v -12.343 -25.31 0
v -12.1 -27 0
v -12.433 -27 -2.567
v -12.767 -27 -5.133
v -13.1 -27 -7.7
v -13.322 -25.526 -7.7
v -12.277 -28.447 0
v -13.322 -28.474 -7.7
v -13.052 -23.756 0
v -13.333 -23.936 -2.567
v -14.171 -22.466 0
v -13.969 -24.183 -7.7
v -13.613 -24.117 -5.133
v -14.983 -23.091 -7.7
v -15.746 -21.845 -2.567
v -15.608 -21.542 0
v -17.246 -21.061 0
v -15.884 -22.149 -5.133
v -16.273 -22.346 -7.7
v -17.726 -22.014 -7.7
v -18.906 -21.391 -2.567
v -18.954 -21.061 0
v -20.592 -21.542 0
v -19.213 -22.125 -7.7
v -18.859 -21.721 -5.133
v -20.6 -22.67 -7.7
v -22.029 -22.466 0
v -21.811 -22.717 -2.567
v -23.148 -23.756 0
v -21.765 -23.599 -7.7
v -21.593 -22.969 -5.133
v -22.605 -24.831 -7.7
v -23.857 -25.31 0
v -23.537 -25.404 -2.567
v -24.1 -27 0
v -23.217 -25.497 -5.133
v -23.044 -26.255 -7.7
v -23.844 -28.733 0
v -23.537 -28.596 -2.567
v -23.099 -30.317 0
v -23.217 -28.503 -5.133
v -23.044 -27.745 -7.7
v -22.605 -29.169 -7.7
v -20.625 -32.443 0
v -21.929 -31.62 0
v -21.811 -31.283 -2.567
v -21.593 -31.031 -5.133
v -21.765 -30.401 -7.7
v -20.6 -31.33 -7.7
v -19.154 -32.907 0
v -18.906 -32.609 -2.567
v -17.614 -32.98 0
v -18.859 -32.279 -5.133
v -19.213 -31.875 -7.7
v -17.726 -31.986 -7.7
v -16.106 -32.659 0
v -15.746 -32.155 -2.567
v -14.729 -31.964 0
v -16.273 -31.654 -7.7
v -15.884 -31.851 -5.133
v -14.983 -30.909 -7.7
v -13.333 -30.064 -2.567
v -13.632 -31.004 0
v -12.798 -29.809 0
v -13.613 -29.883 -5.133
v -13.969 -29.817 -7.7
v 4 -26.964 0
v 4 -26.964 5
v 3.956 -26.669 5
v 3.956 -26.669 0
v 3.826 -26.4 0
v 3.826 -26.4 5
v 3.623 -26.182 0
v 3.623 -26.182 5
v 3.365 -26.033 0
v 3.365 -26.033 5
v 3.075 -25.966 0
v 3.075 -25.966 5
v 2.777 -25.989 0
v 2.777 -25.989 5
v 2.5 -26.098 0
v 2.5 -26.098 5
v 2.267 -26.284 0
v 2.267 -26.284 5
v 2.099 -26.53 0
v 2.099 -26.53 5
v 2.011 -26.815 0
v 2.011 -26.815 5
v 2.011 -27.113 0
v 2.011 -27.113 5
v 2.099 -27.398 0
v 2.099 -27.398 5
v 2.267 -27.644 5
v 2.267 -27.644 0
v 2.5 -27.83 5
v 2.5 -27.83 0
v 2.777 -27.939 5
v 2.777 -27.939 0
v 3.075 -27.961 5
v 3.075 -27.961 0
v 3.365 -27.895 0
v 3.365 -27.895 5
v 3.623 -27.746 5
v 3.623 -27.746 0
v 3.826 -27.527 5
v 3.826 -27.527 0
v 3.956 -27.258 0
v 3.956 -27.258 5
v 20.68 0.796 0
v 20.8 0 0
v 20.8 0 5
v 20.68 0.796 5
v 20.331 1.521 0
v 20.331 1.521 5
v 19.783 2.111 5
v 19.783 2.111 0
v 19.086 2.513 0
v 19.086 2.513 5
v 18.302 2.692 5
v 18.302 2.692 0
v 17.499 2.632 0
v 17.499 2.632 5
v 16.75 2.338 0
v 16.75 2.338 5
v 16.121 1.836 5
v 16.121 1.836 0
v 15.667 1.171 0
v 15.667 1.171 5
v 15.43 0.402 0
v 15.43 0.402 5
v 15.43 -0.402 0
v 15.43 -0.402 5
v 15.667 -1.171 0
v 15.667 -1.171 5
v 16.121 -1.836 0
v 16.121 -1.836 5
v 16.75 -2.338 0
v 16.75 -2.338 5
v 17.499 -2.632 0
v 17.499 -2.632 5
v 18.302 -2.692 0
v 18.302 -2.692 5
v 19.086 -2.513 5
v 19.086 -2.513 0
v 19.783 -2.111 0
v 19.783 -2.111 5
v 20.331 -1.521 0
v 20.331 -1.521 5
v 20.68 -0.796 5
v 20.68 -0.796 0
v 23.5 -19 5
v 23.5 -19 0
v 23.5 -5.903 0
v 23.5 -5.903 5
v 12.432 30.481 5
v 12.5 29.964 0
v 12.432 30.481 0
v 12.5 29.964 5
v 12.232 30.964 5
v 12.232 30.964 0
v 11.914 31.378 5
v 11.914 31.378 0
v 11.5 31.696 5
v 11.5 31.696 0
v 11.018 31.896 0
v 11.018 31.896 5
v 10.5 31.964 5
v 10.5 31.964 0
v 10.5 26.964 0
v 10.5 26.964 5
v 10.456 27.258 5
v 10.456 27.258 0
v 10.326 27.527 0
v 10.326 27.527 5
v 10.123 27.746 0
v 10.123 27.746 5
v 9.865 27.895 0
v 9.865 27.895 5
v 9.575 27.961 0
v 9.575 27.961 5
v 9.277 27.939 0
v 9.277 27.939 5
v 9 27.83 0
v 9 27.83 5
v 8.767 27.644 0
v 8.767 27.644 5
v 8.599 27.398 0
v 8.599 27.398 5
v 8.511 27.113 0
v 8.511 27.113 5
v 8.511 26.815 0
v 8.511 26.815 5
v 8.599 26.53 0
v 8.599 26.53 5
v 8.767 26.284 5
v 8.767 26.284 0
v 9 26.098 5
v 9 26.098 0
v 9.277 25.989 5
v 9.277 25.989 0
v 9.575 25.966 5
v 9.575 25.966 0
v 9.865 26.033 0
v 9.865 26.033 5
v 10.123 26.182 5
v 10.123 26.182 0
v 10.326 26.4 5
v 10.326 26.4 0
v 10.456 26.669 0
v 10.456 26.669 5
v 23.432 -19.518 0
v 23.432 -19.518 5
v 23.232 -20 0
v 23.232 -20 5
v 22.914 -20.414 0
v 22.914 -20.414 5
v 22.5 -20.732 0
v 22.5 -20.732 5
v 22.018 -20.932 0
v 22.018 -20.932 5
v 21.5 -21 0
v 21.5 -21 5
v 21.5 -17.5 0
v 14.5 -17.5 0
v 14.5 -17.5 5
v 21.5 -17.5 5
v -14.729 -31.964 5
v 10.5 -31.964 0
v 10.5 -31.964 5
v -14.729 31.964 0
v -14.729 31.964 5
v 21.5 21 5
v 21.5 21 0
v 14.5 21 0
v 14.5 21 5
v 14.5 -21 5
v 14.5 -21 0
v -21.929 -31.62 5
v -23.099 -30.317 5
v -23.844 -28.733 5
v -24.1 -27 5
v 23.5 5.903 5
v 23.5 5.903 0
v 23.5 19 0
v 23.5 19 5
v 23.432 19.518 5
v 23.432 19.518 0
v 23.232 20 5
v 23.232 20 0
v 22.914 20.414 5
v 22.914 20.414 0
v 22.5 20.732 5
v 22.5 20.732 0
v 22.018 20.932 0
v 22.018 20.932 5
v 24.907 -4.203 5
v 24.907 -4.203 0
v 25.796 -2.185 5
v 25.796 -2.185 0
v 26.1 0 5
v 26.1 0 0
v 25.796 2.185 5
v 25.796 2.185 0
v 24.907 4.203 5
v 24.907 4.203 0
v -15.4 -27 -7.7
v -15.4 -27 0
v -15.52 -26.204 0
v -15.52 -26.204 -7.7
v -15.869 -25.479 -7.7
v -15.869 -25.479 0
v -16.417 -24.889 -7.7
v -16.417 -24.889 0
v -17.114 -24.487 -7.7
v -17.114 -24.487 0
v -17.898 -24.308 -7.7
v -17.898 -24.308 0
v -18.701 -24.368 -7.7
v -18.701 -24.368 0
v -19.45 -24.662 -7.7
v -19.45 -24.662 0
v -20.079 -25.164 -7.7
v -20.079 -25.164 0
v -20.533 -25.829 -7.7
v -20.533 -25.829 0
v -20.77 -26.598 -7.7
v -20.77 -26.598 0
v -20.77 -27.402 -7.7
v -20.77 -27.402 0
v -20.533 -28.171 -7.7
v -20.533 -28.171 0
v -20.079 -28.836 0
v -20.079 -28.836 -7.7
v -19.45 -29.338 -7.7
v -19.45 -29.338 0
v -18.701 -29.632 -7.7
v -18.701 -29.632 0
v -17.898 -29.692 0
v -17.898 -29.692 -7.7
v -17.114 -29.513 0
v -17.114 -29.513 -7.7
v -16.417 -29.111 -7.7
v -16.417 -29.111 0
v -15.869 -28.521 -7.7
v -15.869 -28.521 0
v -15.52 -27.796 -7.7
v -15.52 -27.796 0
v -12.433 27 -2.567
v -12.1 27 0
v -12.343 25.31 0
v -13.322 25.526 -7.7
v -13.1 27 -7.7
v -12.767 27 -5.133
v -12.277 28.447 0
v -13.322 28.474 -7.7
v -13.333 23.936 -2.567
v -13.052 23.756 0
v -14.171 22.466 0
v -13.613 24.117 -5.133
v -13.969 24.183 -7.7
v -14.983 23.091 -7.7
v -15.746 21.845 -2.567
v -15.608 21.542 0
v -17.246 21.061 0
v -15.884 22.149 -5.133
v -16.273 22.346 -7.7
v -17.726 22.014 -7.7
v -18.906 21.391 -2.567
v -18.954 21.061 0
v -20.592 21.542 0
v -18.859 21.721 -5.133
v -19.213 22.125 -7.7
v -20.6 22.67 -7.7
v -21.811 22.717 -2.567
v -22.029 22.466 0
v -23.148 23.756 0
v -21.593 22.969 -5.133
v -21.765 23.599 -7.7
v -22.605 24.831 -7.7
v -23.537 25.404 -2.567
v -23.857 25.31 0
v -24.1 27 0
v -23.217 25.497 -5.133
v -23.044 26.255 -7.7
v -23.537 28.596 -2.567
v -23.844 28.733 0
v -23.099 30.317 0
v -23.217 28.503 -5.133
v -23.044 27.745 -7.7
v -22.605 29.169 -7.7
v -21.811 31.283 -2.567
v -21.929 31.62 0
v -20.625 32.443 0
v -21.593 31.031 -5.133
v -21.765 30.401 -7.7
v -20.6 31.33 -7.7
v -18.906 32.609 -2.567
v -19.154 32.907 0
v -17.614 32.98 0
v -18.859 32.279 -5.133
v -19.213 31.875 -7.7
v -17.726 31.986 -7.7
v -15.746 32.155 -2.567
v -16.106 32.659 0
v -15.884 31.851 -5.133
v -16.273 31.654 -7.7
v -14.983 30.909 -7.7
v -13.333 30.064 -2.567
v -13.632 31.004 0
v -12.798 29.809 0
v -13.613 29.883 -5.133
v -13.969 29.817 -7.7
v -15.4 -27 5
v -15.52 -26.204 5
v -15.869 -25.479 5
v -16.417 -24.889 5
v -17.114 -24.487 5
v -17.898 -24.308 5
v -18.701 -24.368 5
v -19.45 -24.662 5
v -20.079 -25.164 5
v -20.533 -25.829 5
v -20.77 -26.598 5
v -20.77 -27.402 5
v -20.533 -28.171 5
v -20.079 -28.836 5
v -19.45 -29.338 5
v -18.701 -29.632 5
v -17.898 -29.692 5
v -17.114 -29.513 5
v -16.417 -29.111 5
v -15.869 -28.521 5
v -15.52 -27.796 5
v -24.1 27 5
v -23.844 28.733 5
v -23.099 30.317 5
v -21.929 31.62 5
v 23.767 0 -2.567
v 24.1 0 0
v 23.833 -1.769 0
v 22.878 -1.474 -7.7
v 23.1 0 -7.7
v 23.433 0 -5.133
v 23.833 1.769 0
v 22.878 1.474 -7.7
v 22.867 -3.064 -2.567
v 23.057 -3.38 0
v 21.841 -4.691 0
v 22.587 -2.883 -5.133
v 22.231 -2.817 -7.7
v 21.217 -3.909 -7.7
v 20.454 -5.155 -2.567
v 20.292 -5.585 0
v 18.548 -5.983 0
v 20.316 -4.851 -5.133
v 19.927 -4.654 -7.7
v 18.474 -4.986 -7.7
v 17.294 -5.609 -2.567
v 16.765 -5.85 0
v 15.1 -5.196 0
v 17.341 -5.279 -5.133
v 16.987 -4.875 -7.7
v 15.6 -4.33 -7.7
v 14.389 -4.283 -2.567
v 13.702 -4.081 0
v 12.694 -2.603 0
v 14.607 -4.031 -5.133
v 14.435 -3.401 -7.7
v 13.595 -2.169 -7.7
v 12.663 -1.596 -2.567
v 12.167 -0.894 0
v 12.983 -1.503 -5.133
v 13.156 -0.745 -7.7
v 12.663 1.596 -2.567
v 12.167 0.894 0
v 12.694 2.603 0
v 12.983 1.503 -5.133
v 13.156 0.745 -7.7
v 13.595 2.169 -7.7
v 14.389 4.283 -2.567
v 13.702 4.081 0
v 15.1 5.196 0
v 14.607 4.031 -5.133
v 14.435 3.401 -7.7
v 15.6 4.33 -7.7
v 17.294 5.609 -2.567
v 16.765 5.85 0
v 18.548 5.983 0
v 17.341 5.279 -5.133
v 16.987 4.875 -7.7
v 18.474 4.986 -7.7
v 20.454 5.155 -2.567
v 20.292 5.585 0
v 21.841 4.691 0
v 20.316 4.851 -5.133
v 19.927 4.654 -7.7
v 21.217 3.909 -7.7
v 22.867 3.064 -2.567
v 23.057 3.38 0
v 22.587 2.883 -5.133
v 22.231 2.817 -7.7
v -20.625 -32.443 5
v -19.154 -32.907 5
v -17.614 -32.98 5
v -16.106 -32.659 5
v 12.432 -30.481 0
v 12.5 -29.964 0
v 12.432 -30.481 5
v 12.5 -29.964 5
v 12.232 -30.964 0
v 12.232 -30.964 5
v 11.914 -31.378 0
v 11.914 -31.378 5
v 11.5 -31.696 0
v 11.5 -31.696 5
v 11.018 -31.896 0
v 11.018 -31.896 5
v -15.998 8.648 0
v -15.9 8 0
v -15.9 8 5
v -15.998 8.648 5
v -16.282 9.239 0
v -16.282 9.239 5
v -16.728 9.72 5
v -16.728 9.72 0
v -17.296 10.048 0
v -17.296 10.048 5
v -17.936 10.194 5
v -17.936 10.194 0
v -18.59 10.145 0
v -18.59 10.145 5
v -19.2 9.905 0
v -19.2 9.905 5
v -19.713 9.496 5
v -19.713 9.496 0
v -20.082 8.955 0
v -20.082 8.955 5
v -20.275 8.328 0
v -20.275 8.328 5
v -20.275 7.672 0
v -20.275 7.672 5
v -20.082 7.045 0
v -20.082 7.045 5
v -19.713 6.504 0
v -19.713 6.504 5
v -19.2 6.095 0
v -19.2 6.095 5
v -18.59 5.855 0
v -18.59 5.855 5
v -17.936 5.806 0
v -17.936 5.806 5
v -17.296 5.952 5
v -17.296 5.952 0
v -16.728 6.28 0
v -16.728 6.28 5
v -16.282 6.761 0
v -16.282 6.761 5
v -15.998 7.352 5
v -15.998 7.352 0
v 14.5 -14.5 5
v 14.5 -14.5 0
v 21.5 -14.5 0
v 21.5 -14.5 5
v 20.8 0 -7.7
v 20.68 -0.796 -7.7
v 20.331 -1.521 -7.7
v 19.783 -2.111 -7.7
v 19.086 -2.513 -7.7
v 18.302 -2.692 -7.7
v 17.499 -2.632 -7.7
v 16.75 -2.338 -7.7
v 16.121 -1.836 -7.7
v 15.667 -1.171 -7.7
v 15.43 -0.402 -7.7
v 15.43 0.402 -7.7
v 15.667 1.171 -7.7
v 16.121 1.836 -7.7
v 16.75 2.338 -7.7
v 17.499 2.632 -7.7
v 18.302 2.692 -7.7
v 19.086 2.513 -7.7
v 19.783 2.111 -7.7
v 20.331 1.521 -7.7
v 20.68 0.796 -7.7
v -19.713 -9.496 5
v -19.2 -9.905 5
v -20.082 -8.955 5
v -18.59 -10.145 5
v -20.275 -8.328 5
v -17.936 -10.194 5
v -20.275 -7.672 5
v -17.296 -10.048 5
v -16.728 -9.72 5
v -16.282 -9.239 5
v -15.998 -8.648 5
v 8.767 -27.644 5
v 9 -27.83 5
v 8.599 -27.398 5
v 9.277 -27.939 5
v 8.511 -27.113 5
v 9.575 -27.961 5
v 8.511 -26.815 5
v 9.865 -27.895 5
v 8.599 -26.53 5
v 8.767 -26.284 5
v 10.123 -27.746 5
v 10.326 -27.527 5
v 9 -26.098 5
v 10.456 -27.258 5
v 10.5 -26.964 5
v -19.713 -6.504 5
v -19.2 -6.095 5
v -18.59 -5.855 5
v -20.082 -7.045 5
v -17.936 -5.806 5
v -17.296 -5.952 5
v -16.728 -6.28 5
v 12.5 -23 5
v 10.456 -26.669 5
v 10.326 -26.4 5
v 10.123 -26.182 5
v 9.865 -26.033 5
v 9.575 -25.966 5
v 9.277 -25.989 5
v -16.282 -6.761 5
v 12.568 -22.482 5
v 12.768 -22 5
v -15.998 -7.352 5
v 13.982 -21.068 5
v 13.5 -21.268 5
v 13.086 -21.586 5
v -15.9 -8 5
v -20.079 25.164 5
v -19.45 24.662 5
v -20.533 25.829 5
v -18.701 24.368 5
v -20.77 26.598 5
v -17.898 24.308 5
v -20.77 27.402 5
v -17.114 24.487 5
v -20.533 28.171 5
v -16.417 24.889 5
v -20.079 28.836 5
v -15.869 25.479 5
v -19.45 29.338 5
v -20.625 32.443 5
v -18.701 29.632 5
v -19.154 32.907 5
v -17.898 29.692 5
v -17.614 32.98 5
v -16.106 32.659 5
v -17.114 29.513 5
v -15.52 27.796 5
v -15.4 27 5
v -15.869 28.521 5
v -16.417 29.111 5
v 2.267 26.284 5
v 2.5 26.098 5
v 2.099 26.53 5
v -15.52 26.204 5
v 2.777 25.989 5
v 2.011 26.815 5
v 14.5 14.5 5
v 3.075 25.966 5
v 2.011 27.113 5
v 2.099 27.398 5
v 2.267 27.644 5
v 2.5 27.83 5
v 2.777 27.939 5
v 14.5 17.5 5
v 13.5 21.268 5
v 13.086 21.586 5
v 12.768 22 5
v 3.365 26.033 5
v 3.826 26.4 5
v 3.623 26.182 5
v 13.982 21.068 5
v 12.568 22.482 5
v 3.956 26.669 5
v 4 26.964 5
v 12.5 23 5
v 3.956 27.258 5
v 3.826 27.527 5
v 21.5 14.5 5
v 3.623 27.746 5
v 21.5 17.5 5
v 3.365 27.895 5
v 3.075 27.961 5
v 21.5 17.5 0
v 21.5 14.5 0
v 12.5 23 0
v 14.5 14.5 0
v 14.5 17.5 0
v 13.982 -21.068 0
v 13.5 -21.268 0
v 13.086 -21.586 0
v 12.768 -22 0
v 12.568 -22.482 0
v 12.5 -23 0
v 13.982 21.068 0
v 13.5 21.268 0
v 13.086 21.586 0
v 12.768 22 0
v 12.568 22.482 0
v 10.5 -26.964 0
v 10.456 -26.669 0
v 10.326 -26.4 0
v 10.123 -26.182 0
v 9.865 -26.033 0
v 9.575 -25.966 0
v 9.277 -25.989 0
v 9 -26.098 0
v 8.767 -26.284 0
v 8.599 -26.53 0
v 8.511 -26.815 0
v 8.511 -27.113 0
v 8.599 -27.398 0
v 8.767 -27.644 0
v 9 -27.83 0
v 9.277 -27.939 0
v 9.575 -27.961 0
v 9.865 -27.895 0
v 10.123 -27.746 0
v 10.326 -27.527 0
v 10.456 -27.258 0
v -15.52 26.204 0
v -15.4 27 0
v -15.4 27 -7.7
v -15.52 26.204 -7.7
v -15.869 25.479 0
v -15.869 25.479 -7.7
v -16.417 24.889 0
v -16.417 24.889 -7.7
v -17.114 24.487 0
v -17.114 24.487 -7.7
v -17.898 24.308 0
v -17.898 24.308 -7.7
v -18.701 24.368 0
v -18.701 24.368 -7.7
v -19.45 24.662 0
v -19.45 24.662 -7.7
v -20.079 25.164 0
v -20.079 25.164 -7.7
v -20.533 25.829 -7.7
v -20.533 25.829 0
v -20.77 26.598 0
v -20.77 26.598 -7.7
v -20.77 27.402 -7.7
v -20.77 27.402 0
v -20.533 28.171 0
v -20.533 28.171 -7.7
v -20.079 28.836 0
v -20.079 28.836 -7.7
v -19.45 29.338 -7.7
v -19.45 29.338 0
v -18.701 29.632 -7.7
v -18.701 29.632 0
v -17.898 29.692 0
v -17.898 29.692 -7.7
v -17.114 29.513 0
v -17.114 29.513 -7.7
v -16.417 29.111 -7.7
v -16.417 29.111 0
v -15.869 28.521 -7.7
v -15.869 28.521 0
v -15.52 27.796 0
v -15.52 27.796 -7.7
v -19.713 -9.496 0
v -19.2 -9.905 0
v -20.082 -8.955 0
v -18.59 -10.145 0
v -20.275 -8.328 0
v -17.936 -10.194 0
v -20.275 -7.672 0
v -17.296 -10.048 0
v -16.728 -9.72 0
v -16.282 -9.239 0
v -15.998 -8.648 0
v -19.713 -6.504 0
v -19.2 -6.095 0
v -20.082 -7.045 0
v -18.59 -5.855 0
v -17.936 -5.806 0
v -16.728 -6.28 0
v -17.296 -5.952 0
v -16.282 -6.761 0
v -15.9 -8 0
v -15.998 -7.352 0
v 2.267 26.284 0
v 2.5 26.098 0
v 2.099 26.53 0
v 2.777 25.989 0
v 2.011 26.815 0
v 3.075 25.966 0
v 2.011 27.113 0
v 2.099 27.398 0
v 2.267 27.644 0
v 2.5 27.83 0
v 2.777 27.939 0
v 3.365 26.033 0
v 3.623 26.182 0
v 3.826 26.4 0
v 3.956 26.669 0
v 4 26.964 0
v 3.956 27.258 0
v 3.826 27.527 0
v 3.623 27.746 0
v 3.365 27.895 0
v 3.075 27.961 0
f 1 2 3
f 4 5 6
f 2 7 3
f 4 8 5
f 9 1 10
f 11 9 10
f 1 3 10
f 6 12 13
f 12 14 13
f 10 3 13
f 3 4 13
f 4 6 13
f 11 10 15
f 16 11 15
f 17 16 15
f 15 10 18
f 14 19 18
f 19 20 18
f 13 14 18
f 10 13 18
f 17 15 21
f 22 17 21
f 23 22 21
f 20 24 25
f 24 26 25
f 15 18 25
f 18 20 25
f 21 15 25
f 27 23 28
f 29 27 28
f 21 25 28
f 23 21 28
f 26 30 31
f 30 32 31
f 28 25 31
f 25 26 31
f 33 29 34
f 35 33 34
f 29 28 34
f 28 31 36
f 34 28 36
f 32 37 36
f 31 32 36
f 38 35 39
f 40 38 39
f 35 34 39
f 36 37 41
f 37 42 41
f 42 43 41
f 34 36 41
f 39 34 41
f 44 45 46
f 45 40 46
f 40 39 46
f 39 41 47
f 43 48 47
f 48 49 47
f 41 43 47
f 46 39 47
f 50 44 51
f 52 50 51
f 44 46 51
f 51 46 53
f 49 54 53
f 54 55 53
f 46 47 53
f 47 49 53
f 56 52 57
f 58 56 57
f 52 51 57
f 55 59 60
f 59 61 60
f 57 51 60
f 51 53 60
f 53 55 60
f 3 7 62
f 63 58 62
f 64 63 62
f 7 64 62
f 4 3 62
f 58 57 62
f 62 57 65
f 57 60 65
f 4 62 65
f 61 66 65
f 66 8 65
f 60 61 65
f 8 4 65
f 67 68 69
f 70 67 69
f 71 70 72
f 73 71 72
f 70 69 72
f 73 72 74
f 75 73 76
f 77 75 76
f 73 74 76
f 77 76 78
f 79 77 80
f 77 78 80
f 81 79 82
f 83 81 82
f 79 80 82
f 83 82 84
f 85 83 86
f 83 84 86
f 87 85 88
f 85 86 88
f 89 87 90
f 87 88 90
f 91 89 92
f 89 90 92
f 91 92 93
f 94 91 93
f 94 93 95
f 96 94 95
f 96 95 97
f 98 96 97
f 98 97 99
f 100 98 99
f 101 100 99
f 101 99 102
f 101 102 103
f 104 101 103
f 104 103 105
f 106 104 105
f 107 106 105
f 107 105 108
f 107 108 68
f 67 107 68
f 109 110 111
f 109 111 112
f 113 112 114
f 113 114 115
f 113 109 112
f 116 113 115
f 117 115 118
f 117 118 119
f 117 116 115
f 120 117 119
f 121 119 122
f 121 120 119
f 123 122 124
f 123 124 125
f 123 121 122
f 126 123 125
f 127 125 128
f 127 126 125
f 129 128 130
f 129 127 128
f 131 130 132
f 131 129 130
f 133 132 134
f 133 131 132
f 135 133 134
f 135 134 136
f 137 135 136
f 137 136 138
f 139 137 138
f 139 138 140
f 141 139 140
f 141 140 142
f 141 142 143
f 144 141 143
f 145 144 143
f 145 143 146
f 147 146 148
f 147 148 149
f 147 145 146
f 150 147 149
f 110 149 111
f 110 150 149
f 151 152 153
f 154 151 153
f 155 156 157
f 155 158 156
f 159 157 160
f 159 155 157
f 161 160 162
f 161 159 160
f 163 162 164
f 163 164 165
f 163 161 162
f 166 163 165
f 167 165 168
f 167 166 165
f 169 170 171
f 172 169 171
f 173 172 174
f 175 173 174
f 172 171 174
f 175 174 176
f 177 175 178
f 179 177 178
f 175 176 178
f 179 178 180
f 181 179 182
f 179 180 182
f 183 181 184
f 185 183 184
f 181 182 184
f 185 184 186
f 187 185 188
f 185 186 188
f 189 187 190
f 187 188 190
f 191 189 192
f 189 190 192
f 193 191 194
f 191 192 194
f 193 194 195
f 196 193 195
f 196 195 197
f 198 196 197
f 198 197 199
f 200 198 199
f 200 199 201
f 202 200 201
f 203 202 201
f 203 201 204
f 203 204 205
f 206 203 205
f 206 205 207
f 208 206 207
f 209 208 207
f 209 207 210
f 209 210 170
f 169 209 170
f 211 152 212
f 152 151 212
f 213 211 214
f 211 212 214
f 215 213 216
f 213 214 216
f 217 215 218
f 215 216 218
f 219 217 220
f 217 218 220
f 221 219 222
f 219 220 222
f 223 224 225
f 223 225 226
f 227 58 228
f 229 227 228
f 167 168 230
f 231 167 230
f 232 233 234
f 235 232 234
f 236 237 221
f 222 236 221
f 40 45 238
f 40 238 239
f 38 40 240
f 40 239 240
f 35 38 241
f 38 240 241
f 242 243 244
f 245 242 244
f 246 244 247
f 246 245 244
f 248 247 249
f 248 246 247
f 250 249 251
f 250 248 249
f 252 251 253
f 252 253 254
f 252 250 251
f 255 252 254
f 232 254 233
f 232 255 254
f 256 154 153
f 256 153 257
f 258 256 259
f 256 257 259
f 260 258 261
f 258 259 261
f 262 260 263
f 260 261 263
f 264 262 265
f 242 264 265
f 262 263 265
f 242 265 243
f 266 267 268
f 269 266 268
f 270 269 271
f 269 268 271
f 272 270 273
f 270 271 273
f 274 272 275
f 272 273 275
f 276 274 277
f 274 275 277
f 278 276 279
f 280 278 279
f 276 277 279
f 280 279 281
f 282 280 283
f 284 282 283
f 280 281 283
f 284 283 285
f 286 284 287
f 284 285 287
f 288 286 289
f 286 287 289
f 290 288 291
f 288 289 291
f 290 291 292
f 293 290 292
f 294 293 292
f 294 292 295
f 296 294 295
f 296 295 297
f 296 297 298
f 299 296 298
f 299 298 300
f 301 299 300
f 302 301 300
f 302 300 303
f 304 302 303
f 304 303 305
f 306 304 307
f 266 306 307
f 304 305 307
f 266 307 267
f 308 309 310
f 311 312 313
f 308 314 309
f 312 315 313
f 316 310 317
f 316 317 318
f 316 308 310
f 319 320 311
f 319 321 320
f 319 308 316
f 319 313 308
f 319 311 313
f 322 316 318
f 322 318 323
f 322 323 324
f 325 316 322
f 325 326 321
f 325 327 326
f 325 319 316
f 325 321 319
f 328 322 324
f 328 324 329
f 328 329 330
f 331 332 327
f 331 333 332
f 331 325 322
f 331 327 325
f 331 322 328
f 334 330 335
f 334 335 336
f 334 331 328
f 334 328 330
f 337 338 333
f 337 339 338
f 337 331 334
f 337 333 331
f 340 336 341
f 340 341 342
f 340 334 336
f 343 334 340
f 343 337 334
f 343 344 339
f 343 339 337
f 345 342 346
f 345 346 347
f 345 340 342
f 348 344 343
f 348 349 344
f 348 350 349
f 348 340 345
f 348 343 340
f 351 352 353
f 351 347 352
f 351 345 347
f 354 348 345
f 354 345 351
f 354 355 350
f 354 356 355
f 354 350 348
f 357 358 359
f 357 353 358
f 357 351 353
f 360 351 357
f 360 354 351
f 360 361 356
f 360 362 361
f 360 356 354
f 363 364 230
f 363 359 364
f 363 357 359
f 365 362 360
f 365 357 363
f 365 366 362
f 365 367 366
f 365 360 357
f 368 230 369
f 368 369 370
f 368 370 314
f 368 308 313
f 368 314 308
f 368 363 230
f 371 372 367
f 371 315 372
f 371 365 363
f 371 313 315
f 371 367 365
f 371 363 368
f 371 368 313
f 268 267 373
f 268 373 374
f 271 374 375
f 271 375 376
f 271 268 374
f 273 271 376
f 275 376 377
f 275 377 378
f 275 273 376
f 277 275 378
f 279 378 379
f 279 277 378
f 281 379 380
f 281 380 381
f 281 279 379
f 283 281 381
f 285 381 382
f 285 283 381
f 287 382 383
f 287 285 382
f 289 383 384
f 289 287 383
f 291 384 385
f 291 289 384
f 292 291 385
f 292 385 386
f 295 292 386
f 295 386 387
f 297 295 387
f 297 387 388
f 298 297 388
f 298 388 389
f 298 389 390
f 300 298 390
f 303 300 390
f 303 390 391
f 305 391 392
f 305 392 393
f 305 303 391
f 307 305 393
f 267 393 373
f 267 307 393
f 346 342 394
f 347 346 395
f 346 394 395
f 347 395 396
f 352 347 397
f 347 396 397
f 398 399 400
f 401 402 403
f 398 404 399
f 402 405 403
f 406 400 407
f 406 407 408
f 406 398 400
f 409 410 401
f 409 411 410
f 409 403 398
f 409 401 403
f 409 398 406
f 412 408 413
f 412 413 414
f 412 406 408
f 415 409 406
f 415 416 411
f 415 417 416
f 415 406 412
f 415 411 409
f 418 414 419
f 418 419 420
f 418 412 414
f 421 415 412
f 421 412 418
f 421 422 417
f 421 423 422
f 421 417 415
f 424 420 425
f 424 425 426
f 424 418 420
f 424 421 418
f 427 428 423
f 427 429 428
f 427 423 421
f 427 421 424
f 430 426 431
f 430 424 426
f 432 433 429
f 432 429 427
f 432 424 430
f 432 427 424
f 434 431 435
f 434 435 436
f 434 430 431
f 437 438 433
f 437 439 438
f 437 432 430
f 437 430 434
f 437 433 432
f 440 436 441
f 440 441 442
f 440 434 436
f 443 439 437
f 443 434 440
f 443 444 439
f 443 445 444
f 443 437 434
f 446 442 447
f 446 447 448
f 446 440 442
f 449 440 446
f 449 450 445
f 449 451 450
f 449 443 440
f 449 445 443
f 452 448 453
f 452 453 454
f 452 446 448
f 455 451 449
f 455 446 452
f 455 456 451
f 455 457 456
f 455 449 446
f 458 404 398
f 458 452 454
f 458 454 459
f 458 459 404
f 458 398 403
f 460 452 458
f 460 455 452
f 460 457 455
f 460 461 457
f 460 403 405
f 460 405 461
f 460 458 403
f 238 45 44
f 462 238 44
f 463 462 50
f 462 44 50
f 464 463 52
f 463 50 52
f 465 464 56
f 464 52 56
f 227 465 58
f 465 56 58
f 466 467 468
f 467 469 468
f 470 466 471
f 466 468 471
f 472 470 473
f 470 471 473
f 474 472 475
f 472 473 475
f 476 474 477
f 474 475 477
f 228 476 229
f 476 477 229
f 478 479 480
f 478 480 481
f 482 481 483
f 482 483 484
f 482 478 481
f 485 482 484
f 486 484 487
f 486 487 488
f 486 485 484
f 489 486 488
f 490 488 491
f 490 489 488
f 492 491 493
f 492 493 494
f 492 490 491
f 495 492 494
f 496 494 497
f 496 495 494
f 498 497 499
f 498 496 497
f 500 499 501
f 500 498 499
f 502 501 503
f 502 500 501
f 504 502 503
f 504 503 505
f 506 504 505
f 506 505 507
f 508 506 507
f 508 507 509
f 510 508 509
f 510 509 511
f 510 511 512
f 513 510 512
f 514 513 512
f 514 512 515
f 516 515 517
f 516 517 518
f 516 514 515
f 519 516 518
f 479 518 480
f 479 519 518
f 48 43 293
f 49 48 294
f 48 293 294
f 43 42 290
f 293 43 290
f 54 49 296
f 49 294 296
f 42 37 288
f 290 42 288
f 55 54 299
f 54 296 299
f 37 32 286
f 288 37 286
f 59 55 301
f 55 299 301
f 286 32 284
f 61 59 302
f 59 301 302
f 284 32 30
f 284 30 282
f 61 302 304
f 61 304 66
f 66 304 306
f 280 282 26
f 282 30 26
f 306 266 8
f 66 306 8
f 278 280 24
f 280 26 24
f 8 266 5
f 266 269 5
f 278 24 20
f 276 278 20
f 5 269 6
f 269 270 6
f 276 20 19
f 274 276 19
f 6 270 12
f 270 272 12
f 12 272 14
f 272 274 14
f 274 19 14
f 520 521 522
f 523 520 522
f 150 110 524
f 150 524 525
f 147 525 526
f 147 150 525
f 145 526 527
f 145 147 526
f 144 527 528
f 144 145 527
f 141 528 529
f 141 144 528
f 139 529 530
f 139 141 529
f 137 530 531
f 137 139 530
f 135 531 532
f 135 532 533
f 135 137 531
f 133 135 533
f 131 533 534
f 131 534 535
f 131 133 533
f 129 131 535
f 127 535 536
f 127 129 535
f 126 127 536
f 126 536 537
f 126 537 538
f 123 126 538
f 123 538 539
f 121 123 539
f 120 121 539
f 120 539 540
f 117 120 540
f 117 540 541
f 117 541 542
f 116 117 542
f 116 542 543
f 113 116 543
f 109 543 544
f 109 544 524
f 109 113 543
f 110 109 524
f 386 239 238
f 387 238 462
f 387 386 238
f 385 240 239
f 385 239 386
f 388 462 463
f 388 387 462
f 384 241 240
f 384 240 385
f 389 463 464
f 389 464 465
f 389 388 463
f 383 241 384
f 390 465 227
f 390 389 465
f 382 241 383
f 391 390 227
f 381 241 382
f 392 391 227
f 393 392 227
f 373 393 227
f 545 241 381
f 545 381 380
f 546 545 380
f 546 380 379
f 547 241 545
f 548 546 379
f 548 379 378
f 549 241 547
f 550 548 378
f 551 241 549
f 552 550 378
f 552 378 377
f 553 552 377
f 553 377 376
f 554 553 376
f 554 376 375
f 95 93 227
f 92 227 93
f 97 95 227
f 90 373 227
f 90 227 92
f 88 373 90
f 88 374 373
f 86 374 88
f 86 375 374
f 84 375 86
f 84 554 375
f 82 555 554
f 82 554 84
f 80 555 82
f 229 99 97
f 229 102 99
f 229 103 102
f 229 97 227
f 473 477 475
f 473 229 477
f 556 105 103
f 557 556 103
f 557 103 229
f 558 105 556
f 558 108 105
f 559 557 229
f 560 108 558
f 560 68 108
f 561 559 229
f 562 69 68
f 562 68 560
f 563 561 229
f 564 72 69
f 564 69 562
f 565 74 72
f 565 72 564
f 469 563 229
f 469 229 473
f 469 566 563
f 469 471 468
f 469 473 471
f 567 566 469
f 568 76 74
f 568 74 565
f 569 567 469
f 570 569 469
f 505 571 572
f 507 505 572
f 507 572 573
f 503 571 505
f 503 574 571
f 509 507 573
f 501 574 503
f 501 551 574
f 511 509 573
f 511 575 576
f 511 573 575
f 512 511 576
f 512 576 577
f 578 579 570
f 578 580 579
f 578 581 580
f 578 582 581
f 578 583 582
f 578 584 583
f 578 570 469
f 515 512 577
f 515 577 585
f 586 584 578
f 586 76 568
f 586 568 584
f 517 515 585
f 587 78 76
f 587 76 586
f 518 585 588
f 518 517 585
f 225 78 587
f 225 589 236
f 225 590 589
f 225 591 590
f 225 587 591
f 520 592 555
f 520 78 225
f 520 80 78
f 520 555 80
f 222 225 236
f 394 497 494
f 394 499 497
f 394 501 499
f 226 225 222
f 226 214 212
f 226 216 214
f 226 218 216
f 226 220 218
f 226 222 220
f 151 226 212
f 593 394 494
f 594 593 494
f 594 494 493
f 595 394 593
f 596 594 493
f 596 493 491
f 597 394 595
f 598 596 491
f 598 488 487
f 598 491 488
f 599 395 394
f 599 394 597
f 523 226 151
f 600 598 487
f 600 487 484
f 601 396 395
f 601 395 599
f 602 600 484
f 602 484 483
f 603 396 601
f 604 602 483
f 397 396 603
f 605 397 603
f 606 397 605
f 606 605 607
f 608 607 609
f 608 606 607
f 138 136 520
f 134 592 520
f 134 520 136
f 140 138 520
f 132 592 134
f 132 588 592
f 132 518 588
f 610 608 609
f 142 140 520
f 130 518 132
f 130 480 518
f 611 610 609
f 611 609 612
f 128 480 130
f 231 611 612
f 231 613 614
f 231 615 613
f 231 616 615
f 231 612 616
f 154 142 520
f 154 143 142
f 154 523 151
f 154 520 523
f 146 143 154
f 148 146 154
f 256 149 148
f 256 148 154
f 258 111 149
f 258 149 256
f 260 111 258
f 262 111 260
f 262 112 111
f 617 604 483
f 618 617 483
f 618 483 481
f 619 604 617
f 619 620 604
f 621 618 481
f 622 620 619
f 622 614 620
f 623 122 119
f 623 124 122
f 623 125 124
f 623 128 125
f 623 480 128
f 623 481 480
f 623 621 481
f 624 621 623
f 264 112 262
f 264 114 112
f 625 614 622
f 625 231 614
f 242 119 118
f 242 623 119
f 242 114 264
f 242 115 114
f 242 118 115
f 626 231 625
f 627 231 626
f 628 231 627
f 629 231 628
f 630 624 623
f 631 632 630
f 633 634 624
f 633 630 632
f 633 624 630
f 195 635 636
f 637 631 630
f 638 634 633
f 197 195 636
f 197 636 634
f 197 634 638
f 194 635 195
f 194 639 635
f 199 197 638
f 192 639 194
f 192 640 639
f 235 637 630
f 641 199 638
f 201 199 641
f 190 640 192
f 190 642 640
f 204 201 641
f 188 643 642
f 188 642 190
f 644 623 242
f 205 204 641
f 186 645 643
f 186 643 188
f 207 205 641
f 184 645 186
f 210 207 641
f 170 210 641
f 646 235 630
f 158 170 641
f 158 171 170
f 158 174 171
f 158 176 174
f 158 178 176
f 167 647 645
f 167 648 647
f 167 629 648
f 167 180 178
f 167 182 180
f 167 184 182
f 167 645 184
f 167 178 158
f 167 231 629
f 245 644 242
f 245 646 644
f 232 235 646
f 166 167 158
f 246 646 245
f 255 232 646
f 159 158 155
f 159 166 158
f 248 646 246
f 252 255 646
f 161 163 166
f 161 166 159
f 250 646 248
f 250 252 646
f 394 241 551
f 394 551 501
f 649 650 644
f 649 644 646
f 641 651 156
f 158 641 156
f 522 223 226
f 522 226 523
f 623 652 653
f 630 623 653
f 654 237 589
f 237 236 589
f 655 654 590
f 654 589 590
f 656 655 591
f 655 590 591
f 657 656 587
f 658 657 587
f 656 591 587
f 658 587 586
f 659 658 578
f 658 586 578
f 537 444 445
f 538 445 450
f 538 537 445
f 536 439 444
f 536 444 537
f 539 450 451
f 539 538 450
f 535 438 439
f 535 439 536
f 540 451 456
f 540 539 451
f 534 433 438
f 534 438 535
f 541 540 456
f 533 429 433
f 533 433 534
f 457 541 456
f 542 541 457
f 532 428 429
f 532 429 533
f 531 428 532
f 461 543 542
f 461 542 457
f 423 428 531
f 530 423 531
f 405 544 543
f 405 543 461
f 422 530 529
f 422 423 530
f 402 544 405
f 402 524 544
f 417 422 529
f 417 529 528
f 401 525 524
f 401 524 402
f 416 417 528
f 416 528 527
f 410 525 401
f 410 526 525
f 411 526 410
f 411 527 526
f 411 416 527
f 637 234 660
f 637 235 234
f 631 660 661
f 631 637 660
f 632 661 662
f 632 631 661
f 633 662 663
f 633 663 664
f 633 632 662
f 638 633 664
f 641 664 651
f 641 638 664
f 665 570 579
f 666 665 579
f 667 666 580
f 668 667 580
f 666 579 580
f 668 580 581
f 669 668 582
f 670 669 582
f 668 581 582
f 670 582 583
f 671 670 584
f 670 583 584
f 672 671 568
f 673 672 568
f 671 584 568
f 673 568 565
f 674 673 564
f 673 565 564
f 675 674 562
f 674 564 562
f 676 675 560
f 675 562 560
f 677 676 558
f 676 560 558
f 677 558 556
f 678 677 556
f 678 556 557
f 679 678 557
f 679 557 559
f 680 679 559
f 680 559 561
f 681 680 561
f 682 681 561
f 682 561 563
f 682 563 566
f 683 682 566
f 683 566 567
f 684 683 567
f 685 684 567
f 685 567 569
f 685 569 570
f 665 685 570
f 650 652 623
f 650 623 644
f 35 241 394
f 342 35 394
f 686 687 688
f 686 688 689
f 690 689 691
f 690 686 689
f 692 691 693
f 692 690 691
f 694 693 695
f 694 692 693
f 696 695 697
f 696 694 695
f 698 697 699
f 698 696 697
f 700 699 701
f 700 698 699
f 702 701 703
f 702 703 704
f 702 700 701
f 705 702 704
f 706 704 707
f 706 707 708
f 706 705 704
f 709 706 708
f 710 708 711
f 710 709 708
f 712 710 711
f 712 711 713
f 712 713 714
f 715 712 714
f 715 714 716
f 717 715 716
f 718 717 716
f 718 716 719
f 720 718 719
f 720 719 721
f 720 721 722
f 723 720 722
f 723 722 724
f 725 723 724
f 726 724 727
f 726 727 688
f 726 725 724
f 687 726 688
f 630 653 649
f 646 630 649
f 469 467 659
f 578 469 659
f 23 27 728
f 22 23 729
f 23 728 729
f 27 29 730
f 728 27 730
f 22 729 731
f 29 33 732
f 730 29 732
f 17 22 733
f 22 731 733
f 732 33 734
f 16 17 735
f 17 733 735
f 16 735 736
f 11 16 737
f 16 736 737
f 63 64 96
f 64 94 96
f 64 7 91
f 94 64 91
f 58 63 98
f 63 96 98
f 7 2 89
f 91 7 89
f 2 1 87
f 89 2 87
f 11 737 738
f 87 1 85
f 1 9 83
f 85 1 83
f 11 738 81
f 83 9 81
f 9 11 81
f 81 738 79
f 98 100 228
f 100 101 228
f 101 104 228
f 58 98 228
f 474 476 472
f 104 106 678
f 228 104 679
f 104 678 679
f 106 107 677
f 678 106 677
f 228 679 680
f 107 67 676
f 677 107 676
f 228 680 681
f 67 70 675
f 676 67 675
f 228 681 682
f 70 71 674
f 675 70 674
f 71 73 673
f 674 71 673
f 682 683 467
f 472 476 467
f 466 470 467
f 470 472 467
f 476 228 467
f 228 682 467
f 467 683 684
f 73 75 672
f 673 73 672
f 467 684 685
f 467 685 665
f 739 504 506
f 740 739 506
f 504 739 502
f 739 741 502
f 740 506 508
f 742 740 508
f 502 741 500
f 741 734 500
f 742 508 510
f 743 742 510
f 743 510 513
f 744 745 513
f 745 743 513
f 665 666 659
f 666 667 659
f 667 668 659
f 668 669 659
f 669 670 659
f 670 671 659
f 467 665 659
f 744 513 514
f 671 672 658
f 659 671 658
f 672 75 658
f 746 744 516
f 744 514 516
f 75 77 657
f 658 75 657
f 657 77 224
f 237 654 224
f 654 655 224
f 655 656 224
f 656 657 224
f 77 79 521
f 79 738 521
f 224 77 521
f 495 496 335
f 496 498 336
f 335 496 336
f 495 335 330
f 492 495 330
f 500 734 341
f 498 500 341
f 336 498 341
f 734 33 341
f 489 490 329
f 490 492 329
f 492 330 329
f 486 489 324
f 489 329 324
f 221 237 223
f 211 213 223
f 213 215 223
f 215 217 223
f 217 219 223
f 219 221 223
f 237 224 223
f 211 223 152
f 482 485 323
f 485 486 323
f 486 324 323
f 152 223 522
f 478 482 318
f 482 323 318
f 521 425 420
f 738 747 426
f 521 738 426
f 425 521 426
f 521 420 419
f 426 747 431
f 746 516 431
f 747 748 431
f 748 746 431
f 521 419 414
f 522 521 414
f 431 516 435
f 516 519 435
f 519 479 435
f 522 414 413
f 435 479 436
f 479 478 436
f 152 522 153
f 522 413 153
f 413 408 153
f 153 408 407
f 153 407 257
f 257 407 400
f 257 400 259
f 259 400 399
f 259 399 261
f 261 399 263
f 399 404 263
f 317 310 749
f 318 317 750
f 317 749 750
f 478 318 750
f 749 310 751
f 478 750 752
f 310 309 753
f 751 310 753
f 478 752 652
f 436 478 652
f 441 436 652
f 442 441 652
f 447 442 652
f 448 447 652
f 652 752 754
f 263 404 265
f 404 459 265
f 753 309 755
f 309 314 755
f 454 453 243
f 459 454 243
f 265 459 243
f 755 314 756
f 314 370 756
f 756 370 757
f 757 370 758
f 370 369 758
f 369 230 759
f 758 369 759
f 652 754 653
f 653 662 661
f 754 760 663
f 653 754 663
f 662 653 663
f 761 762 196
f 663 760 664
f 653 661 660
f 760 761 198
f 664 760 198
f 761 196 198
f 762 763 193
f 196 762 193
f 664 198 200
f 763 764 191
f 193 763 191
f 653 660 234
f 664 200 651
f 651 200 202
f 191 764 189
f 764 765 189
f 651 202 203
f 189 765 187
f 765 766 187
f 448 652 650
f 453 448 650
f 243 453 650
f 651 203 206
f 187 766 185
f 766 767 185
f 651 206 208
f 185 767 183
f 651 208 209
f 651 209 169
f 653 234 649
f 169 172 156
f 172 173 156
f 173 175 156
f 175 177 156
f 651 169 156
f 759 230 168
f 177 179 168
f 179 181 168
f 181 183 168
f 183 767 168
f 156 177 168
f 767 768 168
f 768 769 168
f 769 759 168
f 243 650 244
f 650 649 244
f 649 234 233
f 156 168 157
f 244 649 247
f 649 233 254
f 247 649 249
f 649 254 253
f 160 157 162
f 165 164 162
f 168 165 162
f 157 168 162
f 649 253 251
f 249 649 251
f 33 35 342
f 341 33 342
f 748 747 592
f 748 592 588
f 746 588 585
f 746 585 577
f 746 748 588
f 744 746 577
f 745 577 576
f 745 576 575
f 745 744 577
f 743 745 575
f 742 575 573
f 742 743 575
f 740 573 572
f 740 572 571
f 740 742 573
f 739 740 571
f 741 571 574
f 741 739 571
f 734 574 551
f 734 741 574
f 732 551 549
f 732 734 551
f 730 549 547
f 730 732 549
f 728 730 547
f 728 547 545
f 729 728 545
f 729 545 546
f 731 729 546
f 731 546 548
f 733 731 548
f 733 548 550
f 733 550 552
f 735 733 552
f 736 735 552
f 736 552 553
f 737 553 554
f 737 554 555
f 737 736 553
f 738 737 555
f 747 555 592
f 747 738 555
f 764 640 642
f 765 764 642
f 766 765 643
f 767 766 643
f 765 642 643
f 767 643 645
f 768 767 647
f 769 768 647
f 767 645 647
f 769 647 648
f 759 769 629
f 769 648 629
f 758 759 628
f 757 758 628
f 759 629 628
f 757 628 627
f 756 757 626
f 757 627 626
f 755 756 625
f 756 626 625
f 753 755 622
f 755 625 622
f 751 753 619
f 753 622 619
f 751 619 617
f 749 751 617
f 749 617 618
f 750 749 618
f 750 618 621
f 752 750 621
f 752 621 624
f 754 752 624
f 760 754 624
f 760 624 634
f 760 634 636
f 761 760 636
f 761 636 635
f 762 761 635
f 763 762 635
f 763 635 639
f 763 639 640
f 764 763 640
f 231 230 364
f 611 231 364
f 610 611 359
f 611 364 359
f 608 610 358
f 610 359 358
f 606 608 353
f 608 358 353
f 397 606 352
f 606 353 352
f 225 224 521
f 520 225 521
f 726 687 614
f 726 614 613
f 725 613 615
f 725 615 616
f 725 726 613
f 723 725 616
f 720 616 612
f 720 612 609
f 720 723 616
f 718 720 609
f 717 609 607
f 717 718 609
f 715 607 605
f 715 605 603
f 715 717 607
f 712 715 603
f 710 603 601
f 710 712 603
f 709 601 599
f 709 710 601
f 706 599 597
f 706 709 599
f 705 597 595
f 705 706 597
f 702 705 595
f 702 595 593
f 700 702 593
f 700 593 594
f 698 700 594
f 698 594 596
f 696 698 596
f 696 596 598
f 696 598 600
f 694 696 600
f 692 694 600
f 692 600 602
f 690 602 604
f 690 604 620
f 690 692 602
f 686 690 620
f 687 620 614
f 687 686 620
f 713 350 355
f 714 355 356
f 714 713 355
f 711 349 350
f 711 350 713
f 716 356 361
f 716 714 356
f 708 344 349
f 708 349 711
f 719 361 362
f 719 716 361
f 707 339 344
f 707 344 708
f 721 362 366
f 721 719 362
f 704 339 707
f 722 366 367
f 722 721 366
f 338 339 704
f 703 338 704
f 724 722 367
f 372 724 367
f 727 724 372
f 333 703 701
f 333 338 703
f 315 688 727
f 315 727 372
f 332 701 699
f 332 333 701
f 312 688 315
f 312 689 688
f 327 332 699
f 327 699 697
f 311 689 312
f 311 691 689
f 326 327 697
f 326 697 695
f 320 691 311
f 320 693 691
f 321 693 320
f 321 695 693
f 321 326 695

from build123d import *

# Parameters (mm, degrees)
SKETCH_1_R          = 2.2
SKETCH_1_R_2        = 2.7
EXTRUDE_1_DEPTH     = 5
CUT_EXTRUDE_1_REACH = 59.23
EXTRUDE_START       = -5
SKETCH_6_W          = 7
SKETCH_6_H          = 3
SKETCH_6_R          = 2.7
EXTRUDE_3_DEPTH     = 5
CUT_EXTRUDE_2_REACH = 45.949
SKETCH_8_R          = 1
FILLET_1_R          = 2


with BuildPart() as part:
    # 草图1 → 凸台-拉伸1 (new body)
    with BuildSketch(Plane.XY):
        with BuildLine():
            Line((-21.928513003, 31.619793089), (-45, 12.5))
            Line((-45, 12.5), (-45, -12.5))
            Line((-45, -12.5), (-21.928513003, -31.619793089))
            ThreePointArc((-21.928513003, -31.619793089), (-18.386291168, -32.993165888), (-14.729286549, -31.963697294))
            Line((-14.729286549, -31.963697294), (22.594284602, -6.618263059))
            ThreePointArc((22.594284602, -6.618263059), (26.1, 0), (22.594284602, 6.618263059))
            Line((22.594284602, 6.618263059), (-14.729286549, 31.963697294))
            ThreePointArc((-14.729286549, 31.963697294), (-18.386291168, 32.993165888), (-21.928513003, 31.619793089))
        make_face()
        with Locations((-18.1, -8)):
            Circle(SKETCH_1_R, mode=Mode.SUBTRACT)
        with Locations((-18.1, 8)):
            Circle(SKETCH_1_R, mode=Mode.SUBTRACT)
        with Locations((-34.1, 0)):
            Circle(SKETCH_1_R, mode=Mode.SUBTRACT)
        with Locations((-18.1, 27)):
            Circle(SKETCH_1_R_2, mode=Mode.SUBTRACT)
        with Locations((-18.1, -27)):
            Circle(SKETCH_1_R_2, mode=Mode.SUBTRACT)
        with Locations((18.1, 0)):
            Circle(SKETCH_1_R_2, mode=Mode.SUBTRACT)
    extrude(amount=EXTRUDE_1_DEPTH)

    # 草图4 → 旋转1 (revolve)
    with BuildSketch(Plane(origin=(-24.93598604, 16.933358057, 0), x_dir=(0, 0, -1), z_dir=(0.8272828823621655, -0.5617855752425007, 0)), mode=Mode.PRIVATE) as revolve_1_sk:
        Polygon((7.7, 17.168318912), (7.7, 14.868318912), (0, 14.868318912), (0, 18.168318912), align=None)
    revolve_1 = revolve(revolve_1_sk.sketch.rotate(Axis((-18.1, 27, 1000.278995542), (0, 0, -1)), 55.820627671), axis=Axis((-18.1, 27, 1000.278995542), (0, 0, -1)))

    # 镜向1: 旋转1 across plane
    add(revolve_1.mirror(Plane.ZX))

    # 草图5 → 切除-拉伸1 (cut, up to next)
    with BuildSketch(Plane.XY.offset(5), mode=Mode.PRIVATE) as cut_extrude_1_sk1:
        with BuildLine():
            Line((-24.1, -27), (-24.1, 27))
            ThreePointArc((-24.1, 27), (-23.53005884, 29.552344215), (-21.928513003, 31.619793089))
            Line((-21.928513003, 31.619793089), (-45, 12.5))
            Line((-45, 12.5), (-45, -12.5))
            Line((-45, -12.5), (-21.928513003, -31.619793089))
            ThreePointArc((-21.928513003, -31.619793089), (-23.53005884, -29.552344215), (-24.1, -27))
        make_face()
    cut_extrude_1_tool1 = extrude(cut_extrude_1_sk1.sketch, amount=-CUT_EXTRUDE_1_REACH, mode=Mode.PRIVATE) & part.part
    add(cut_extrude_1_tool1.solids().sort_by_distance((-33.100815, 0, 5))[0], mode=Mode.SUBTRACT)

    # 草图6 → 凸台-拉伸3 (add)
    with BuildSketch(Plane.XY.offset(5).offset(EXTRUDE_START)):
        Polygon((12.5, -13.473020485), (-14.729286549, -31.963697294), (12.5, -31.963697294), (12.5, -21), (23.5, -21), (23.5, 21), (12.5, 21), (12.5, 31.963697294), (-14.729286549, 31.963697294), (12.5, 13.473020485), align=None)
        with Locations((18, -16)):
            Rectangle(SKETCH_6_W, SKETCH_6_H, mode=Mode.SUBTRACT)
        with Locations((18.1, 0)):
            Circle(SKETCH_6_R, mode=Mode.SUBTRACT)
        with Locations((18, 16)):
            Rectangle(SKETCH_6_W, SKETCH_6_H, mode=Mode.SUBTRACT)
    extrude(amount=EXTRUDE_3_DEPTH)

    # 草图8 → 切除-拉伸2 (cut, up to next)
    with BuildSketch(Plane.XY.offset(5), mode=Mode.PRIVATE) as cut_extrude_2_sk1:
        with Locations((9.5, -26.963697294)):
            Circle(SKETCH_8_R)
    cut_extrude_2_tool1 = extrude(cut_extrude_2_sk1.sketch, amount=-CUT_EXTRUDE_2_REACH, mode=Mode.PRIVATE) & part.part
    # 草图8 → 切除-拉伸2 (cut, up to next)
    with BuildSketch(Plane.XY.offset(5), mode=Mode.PRIVATE) as cut_extrude_2_sk2:
        with Locations((3, -26.963697294)):
            Circle(SKETCH_8_R)
    cut_extrude_2_tool2 = extrude(cut_extrude_2_sk2.sketch, amount=-CUT_EXTRUDE_2_REACH, mode=Mode.PRIVATE) & part.part
    # 草图8 → 切除-拉伸2 (cut, up to next)
    with BuildSketch(Plane.XY.offset(5), mode=Mode.PRIVATE) as cut_extrude_2_sk3:
        with Locations((9.5, 26.963697294)):
            Circle(SKETCH_8_R)
    cut_extrude_2_tool3 = extrude(cut_extrude_2_sk3.sketch, amount=-CUT_EXTRUDE_2_REACH, mode=Mode.PRIVATE) & part.part
    # 草图8 → 切除-拉伸2 (cut, up to next)
    with BuildSketch(Plane.XY.offset(5), mode=Mode.PRIVATE) as cut_extrude_2_sk4:
        with Locations((3, 26.963697294)):
            Circle(SKETCH_8_R)
    cut_extrude_2_tool4 = extrude(cut_extrude_2_sk4.sketch, amount=-CUT_EXTRUDE_2_REACH, mode=Mode.PRIVATE) & part.part
    add(cut_extrude_2_tool1.solids().sort_by_distance((9.5, -26.963697, 5))[0], mode=Mode.SUBTRACT)
    add(cut_extrude_2_tool2.solids().sort_by_distance((3, -26.963697, 5))[0], mode=Mode.SUBTRACT)
    add(cut_extrude_2_tool3.solids().sort_by_distance((9.5, 26.963697, 5))[0], mode=Mode.SUBTRACT)
    add(cut_extrude_2_tool4.solids().sort_by_distance((3, 26.963697, 5))[0], mode=Mode.SUBTRACT)

    # 草图7 → 旋转2 (revolve)
    with BuildSketch(Plane(origin=(6.469864276, 8.674410623, 0), x_dir=(0.8015915013283047, -0.5978721142503927, 0), z_dir=(0.5978721142503927, 0.8015915013283047, 0)), mode=Mode.PRIVATE) as revolve_2_sk:
        Polygon((11.808806174, 7.7), (11.808806174, 0), (8.508806174, 0), (9.508806174, 7.7), align=None)
    revolve(revolve_2_sk.sketch.rotate(Axis((18.1, 0, 1), (0, 0, -1)), 143.282349417), axis=Axis((18.1, 0, 1), (0, 0, -1)))

    # 圆角1
    fillet_1_edges = [part.edges().sort_by_distance(p)[0] for p in [
        (12.5, 31.963697294, 2.5),
        (12.5, 21, 2.5),
        (23.5, 21, 2.5),
        (12.5, -21, 2.5),
        (23.5, -21, 2.5),
        (12.5, -31.963697294, 2.5),
    ]]
    fillet(fillet_1_edges, radius=FILLET_1_R)


solid = part.part
